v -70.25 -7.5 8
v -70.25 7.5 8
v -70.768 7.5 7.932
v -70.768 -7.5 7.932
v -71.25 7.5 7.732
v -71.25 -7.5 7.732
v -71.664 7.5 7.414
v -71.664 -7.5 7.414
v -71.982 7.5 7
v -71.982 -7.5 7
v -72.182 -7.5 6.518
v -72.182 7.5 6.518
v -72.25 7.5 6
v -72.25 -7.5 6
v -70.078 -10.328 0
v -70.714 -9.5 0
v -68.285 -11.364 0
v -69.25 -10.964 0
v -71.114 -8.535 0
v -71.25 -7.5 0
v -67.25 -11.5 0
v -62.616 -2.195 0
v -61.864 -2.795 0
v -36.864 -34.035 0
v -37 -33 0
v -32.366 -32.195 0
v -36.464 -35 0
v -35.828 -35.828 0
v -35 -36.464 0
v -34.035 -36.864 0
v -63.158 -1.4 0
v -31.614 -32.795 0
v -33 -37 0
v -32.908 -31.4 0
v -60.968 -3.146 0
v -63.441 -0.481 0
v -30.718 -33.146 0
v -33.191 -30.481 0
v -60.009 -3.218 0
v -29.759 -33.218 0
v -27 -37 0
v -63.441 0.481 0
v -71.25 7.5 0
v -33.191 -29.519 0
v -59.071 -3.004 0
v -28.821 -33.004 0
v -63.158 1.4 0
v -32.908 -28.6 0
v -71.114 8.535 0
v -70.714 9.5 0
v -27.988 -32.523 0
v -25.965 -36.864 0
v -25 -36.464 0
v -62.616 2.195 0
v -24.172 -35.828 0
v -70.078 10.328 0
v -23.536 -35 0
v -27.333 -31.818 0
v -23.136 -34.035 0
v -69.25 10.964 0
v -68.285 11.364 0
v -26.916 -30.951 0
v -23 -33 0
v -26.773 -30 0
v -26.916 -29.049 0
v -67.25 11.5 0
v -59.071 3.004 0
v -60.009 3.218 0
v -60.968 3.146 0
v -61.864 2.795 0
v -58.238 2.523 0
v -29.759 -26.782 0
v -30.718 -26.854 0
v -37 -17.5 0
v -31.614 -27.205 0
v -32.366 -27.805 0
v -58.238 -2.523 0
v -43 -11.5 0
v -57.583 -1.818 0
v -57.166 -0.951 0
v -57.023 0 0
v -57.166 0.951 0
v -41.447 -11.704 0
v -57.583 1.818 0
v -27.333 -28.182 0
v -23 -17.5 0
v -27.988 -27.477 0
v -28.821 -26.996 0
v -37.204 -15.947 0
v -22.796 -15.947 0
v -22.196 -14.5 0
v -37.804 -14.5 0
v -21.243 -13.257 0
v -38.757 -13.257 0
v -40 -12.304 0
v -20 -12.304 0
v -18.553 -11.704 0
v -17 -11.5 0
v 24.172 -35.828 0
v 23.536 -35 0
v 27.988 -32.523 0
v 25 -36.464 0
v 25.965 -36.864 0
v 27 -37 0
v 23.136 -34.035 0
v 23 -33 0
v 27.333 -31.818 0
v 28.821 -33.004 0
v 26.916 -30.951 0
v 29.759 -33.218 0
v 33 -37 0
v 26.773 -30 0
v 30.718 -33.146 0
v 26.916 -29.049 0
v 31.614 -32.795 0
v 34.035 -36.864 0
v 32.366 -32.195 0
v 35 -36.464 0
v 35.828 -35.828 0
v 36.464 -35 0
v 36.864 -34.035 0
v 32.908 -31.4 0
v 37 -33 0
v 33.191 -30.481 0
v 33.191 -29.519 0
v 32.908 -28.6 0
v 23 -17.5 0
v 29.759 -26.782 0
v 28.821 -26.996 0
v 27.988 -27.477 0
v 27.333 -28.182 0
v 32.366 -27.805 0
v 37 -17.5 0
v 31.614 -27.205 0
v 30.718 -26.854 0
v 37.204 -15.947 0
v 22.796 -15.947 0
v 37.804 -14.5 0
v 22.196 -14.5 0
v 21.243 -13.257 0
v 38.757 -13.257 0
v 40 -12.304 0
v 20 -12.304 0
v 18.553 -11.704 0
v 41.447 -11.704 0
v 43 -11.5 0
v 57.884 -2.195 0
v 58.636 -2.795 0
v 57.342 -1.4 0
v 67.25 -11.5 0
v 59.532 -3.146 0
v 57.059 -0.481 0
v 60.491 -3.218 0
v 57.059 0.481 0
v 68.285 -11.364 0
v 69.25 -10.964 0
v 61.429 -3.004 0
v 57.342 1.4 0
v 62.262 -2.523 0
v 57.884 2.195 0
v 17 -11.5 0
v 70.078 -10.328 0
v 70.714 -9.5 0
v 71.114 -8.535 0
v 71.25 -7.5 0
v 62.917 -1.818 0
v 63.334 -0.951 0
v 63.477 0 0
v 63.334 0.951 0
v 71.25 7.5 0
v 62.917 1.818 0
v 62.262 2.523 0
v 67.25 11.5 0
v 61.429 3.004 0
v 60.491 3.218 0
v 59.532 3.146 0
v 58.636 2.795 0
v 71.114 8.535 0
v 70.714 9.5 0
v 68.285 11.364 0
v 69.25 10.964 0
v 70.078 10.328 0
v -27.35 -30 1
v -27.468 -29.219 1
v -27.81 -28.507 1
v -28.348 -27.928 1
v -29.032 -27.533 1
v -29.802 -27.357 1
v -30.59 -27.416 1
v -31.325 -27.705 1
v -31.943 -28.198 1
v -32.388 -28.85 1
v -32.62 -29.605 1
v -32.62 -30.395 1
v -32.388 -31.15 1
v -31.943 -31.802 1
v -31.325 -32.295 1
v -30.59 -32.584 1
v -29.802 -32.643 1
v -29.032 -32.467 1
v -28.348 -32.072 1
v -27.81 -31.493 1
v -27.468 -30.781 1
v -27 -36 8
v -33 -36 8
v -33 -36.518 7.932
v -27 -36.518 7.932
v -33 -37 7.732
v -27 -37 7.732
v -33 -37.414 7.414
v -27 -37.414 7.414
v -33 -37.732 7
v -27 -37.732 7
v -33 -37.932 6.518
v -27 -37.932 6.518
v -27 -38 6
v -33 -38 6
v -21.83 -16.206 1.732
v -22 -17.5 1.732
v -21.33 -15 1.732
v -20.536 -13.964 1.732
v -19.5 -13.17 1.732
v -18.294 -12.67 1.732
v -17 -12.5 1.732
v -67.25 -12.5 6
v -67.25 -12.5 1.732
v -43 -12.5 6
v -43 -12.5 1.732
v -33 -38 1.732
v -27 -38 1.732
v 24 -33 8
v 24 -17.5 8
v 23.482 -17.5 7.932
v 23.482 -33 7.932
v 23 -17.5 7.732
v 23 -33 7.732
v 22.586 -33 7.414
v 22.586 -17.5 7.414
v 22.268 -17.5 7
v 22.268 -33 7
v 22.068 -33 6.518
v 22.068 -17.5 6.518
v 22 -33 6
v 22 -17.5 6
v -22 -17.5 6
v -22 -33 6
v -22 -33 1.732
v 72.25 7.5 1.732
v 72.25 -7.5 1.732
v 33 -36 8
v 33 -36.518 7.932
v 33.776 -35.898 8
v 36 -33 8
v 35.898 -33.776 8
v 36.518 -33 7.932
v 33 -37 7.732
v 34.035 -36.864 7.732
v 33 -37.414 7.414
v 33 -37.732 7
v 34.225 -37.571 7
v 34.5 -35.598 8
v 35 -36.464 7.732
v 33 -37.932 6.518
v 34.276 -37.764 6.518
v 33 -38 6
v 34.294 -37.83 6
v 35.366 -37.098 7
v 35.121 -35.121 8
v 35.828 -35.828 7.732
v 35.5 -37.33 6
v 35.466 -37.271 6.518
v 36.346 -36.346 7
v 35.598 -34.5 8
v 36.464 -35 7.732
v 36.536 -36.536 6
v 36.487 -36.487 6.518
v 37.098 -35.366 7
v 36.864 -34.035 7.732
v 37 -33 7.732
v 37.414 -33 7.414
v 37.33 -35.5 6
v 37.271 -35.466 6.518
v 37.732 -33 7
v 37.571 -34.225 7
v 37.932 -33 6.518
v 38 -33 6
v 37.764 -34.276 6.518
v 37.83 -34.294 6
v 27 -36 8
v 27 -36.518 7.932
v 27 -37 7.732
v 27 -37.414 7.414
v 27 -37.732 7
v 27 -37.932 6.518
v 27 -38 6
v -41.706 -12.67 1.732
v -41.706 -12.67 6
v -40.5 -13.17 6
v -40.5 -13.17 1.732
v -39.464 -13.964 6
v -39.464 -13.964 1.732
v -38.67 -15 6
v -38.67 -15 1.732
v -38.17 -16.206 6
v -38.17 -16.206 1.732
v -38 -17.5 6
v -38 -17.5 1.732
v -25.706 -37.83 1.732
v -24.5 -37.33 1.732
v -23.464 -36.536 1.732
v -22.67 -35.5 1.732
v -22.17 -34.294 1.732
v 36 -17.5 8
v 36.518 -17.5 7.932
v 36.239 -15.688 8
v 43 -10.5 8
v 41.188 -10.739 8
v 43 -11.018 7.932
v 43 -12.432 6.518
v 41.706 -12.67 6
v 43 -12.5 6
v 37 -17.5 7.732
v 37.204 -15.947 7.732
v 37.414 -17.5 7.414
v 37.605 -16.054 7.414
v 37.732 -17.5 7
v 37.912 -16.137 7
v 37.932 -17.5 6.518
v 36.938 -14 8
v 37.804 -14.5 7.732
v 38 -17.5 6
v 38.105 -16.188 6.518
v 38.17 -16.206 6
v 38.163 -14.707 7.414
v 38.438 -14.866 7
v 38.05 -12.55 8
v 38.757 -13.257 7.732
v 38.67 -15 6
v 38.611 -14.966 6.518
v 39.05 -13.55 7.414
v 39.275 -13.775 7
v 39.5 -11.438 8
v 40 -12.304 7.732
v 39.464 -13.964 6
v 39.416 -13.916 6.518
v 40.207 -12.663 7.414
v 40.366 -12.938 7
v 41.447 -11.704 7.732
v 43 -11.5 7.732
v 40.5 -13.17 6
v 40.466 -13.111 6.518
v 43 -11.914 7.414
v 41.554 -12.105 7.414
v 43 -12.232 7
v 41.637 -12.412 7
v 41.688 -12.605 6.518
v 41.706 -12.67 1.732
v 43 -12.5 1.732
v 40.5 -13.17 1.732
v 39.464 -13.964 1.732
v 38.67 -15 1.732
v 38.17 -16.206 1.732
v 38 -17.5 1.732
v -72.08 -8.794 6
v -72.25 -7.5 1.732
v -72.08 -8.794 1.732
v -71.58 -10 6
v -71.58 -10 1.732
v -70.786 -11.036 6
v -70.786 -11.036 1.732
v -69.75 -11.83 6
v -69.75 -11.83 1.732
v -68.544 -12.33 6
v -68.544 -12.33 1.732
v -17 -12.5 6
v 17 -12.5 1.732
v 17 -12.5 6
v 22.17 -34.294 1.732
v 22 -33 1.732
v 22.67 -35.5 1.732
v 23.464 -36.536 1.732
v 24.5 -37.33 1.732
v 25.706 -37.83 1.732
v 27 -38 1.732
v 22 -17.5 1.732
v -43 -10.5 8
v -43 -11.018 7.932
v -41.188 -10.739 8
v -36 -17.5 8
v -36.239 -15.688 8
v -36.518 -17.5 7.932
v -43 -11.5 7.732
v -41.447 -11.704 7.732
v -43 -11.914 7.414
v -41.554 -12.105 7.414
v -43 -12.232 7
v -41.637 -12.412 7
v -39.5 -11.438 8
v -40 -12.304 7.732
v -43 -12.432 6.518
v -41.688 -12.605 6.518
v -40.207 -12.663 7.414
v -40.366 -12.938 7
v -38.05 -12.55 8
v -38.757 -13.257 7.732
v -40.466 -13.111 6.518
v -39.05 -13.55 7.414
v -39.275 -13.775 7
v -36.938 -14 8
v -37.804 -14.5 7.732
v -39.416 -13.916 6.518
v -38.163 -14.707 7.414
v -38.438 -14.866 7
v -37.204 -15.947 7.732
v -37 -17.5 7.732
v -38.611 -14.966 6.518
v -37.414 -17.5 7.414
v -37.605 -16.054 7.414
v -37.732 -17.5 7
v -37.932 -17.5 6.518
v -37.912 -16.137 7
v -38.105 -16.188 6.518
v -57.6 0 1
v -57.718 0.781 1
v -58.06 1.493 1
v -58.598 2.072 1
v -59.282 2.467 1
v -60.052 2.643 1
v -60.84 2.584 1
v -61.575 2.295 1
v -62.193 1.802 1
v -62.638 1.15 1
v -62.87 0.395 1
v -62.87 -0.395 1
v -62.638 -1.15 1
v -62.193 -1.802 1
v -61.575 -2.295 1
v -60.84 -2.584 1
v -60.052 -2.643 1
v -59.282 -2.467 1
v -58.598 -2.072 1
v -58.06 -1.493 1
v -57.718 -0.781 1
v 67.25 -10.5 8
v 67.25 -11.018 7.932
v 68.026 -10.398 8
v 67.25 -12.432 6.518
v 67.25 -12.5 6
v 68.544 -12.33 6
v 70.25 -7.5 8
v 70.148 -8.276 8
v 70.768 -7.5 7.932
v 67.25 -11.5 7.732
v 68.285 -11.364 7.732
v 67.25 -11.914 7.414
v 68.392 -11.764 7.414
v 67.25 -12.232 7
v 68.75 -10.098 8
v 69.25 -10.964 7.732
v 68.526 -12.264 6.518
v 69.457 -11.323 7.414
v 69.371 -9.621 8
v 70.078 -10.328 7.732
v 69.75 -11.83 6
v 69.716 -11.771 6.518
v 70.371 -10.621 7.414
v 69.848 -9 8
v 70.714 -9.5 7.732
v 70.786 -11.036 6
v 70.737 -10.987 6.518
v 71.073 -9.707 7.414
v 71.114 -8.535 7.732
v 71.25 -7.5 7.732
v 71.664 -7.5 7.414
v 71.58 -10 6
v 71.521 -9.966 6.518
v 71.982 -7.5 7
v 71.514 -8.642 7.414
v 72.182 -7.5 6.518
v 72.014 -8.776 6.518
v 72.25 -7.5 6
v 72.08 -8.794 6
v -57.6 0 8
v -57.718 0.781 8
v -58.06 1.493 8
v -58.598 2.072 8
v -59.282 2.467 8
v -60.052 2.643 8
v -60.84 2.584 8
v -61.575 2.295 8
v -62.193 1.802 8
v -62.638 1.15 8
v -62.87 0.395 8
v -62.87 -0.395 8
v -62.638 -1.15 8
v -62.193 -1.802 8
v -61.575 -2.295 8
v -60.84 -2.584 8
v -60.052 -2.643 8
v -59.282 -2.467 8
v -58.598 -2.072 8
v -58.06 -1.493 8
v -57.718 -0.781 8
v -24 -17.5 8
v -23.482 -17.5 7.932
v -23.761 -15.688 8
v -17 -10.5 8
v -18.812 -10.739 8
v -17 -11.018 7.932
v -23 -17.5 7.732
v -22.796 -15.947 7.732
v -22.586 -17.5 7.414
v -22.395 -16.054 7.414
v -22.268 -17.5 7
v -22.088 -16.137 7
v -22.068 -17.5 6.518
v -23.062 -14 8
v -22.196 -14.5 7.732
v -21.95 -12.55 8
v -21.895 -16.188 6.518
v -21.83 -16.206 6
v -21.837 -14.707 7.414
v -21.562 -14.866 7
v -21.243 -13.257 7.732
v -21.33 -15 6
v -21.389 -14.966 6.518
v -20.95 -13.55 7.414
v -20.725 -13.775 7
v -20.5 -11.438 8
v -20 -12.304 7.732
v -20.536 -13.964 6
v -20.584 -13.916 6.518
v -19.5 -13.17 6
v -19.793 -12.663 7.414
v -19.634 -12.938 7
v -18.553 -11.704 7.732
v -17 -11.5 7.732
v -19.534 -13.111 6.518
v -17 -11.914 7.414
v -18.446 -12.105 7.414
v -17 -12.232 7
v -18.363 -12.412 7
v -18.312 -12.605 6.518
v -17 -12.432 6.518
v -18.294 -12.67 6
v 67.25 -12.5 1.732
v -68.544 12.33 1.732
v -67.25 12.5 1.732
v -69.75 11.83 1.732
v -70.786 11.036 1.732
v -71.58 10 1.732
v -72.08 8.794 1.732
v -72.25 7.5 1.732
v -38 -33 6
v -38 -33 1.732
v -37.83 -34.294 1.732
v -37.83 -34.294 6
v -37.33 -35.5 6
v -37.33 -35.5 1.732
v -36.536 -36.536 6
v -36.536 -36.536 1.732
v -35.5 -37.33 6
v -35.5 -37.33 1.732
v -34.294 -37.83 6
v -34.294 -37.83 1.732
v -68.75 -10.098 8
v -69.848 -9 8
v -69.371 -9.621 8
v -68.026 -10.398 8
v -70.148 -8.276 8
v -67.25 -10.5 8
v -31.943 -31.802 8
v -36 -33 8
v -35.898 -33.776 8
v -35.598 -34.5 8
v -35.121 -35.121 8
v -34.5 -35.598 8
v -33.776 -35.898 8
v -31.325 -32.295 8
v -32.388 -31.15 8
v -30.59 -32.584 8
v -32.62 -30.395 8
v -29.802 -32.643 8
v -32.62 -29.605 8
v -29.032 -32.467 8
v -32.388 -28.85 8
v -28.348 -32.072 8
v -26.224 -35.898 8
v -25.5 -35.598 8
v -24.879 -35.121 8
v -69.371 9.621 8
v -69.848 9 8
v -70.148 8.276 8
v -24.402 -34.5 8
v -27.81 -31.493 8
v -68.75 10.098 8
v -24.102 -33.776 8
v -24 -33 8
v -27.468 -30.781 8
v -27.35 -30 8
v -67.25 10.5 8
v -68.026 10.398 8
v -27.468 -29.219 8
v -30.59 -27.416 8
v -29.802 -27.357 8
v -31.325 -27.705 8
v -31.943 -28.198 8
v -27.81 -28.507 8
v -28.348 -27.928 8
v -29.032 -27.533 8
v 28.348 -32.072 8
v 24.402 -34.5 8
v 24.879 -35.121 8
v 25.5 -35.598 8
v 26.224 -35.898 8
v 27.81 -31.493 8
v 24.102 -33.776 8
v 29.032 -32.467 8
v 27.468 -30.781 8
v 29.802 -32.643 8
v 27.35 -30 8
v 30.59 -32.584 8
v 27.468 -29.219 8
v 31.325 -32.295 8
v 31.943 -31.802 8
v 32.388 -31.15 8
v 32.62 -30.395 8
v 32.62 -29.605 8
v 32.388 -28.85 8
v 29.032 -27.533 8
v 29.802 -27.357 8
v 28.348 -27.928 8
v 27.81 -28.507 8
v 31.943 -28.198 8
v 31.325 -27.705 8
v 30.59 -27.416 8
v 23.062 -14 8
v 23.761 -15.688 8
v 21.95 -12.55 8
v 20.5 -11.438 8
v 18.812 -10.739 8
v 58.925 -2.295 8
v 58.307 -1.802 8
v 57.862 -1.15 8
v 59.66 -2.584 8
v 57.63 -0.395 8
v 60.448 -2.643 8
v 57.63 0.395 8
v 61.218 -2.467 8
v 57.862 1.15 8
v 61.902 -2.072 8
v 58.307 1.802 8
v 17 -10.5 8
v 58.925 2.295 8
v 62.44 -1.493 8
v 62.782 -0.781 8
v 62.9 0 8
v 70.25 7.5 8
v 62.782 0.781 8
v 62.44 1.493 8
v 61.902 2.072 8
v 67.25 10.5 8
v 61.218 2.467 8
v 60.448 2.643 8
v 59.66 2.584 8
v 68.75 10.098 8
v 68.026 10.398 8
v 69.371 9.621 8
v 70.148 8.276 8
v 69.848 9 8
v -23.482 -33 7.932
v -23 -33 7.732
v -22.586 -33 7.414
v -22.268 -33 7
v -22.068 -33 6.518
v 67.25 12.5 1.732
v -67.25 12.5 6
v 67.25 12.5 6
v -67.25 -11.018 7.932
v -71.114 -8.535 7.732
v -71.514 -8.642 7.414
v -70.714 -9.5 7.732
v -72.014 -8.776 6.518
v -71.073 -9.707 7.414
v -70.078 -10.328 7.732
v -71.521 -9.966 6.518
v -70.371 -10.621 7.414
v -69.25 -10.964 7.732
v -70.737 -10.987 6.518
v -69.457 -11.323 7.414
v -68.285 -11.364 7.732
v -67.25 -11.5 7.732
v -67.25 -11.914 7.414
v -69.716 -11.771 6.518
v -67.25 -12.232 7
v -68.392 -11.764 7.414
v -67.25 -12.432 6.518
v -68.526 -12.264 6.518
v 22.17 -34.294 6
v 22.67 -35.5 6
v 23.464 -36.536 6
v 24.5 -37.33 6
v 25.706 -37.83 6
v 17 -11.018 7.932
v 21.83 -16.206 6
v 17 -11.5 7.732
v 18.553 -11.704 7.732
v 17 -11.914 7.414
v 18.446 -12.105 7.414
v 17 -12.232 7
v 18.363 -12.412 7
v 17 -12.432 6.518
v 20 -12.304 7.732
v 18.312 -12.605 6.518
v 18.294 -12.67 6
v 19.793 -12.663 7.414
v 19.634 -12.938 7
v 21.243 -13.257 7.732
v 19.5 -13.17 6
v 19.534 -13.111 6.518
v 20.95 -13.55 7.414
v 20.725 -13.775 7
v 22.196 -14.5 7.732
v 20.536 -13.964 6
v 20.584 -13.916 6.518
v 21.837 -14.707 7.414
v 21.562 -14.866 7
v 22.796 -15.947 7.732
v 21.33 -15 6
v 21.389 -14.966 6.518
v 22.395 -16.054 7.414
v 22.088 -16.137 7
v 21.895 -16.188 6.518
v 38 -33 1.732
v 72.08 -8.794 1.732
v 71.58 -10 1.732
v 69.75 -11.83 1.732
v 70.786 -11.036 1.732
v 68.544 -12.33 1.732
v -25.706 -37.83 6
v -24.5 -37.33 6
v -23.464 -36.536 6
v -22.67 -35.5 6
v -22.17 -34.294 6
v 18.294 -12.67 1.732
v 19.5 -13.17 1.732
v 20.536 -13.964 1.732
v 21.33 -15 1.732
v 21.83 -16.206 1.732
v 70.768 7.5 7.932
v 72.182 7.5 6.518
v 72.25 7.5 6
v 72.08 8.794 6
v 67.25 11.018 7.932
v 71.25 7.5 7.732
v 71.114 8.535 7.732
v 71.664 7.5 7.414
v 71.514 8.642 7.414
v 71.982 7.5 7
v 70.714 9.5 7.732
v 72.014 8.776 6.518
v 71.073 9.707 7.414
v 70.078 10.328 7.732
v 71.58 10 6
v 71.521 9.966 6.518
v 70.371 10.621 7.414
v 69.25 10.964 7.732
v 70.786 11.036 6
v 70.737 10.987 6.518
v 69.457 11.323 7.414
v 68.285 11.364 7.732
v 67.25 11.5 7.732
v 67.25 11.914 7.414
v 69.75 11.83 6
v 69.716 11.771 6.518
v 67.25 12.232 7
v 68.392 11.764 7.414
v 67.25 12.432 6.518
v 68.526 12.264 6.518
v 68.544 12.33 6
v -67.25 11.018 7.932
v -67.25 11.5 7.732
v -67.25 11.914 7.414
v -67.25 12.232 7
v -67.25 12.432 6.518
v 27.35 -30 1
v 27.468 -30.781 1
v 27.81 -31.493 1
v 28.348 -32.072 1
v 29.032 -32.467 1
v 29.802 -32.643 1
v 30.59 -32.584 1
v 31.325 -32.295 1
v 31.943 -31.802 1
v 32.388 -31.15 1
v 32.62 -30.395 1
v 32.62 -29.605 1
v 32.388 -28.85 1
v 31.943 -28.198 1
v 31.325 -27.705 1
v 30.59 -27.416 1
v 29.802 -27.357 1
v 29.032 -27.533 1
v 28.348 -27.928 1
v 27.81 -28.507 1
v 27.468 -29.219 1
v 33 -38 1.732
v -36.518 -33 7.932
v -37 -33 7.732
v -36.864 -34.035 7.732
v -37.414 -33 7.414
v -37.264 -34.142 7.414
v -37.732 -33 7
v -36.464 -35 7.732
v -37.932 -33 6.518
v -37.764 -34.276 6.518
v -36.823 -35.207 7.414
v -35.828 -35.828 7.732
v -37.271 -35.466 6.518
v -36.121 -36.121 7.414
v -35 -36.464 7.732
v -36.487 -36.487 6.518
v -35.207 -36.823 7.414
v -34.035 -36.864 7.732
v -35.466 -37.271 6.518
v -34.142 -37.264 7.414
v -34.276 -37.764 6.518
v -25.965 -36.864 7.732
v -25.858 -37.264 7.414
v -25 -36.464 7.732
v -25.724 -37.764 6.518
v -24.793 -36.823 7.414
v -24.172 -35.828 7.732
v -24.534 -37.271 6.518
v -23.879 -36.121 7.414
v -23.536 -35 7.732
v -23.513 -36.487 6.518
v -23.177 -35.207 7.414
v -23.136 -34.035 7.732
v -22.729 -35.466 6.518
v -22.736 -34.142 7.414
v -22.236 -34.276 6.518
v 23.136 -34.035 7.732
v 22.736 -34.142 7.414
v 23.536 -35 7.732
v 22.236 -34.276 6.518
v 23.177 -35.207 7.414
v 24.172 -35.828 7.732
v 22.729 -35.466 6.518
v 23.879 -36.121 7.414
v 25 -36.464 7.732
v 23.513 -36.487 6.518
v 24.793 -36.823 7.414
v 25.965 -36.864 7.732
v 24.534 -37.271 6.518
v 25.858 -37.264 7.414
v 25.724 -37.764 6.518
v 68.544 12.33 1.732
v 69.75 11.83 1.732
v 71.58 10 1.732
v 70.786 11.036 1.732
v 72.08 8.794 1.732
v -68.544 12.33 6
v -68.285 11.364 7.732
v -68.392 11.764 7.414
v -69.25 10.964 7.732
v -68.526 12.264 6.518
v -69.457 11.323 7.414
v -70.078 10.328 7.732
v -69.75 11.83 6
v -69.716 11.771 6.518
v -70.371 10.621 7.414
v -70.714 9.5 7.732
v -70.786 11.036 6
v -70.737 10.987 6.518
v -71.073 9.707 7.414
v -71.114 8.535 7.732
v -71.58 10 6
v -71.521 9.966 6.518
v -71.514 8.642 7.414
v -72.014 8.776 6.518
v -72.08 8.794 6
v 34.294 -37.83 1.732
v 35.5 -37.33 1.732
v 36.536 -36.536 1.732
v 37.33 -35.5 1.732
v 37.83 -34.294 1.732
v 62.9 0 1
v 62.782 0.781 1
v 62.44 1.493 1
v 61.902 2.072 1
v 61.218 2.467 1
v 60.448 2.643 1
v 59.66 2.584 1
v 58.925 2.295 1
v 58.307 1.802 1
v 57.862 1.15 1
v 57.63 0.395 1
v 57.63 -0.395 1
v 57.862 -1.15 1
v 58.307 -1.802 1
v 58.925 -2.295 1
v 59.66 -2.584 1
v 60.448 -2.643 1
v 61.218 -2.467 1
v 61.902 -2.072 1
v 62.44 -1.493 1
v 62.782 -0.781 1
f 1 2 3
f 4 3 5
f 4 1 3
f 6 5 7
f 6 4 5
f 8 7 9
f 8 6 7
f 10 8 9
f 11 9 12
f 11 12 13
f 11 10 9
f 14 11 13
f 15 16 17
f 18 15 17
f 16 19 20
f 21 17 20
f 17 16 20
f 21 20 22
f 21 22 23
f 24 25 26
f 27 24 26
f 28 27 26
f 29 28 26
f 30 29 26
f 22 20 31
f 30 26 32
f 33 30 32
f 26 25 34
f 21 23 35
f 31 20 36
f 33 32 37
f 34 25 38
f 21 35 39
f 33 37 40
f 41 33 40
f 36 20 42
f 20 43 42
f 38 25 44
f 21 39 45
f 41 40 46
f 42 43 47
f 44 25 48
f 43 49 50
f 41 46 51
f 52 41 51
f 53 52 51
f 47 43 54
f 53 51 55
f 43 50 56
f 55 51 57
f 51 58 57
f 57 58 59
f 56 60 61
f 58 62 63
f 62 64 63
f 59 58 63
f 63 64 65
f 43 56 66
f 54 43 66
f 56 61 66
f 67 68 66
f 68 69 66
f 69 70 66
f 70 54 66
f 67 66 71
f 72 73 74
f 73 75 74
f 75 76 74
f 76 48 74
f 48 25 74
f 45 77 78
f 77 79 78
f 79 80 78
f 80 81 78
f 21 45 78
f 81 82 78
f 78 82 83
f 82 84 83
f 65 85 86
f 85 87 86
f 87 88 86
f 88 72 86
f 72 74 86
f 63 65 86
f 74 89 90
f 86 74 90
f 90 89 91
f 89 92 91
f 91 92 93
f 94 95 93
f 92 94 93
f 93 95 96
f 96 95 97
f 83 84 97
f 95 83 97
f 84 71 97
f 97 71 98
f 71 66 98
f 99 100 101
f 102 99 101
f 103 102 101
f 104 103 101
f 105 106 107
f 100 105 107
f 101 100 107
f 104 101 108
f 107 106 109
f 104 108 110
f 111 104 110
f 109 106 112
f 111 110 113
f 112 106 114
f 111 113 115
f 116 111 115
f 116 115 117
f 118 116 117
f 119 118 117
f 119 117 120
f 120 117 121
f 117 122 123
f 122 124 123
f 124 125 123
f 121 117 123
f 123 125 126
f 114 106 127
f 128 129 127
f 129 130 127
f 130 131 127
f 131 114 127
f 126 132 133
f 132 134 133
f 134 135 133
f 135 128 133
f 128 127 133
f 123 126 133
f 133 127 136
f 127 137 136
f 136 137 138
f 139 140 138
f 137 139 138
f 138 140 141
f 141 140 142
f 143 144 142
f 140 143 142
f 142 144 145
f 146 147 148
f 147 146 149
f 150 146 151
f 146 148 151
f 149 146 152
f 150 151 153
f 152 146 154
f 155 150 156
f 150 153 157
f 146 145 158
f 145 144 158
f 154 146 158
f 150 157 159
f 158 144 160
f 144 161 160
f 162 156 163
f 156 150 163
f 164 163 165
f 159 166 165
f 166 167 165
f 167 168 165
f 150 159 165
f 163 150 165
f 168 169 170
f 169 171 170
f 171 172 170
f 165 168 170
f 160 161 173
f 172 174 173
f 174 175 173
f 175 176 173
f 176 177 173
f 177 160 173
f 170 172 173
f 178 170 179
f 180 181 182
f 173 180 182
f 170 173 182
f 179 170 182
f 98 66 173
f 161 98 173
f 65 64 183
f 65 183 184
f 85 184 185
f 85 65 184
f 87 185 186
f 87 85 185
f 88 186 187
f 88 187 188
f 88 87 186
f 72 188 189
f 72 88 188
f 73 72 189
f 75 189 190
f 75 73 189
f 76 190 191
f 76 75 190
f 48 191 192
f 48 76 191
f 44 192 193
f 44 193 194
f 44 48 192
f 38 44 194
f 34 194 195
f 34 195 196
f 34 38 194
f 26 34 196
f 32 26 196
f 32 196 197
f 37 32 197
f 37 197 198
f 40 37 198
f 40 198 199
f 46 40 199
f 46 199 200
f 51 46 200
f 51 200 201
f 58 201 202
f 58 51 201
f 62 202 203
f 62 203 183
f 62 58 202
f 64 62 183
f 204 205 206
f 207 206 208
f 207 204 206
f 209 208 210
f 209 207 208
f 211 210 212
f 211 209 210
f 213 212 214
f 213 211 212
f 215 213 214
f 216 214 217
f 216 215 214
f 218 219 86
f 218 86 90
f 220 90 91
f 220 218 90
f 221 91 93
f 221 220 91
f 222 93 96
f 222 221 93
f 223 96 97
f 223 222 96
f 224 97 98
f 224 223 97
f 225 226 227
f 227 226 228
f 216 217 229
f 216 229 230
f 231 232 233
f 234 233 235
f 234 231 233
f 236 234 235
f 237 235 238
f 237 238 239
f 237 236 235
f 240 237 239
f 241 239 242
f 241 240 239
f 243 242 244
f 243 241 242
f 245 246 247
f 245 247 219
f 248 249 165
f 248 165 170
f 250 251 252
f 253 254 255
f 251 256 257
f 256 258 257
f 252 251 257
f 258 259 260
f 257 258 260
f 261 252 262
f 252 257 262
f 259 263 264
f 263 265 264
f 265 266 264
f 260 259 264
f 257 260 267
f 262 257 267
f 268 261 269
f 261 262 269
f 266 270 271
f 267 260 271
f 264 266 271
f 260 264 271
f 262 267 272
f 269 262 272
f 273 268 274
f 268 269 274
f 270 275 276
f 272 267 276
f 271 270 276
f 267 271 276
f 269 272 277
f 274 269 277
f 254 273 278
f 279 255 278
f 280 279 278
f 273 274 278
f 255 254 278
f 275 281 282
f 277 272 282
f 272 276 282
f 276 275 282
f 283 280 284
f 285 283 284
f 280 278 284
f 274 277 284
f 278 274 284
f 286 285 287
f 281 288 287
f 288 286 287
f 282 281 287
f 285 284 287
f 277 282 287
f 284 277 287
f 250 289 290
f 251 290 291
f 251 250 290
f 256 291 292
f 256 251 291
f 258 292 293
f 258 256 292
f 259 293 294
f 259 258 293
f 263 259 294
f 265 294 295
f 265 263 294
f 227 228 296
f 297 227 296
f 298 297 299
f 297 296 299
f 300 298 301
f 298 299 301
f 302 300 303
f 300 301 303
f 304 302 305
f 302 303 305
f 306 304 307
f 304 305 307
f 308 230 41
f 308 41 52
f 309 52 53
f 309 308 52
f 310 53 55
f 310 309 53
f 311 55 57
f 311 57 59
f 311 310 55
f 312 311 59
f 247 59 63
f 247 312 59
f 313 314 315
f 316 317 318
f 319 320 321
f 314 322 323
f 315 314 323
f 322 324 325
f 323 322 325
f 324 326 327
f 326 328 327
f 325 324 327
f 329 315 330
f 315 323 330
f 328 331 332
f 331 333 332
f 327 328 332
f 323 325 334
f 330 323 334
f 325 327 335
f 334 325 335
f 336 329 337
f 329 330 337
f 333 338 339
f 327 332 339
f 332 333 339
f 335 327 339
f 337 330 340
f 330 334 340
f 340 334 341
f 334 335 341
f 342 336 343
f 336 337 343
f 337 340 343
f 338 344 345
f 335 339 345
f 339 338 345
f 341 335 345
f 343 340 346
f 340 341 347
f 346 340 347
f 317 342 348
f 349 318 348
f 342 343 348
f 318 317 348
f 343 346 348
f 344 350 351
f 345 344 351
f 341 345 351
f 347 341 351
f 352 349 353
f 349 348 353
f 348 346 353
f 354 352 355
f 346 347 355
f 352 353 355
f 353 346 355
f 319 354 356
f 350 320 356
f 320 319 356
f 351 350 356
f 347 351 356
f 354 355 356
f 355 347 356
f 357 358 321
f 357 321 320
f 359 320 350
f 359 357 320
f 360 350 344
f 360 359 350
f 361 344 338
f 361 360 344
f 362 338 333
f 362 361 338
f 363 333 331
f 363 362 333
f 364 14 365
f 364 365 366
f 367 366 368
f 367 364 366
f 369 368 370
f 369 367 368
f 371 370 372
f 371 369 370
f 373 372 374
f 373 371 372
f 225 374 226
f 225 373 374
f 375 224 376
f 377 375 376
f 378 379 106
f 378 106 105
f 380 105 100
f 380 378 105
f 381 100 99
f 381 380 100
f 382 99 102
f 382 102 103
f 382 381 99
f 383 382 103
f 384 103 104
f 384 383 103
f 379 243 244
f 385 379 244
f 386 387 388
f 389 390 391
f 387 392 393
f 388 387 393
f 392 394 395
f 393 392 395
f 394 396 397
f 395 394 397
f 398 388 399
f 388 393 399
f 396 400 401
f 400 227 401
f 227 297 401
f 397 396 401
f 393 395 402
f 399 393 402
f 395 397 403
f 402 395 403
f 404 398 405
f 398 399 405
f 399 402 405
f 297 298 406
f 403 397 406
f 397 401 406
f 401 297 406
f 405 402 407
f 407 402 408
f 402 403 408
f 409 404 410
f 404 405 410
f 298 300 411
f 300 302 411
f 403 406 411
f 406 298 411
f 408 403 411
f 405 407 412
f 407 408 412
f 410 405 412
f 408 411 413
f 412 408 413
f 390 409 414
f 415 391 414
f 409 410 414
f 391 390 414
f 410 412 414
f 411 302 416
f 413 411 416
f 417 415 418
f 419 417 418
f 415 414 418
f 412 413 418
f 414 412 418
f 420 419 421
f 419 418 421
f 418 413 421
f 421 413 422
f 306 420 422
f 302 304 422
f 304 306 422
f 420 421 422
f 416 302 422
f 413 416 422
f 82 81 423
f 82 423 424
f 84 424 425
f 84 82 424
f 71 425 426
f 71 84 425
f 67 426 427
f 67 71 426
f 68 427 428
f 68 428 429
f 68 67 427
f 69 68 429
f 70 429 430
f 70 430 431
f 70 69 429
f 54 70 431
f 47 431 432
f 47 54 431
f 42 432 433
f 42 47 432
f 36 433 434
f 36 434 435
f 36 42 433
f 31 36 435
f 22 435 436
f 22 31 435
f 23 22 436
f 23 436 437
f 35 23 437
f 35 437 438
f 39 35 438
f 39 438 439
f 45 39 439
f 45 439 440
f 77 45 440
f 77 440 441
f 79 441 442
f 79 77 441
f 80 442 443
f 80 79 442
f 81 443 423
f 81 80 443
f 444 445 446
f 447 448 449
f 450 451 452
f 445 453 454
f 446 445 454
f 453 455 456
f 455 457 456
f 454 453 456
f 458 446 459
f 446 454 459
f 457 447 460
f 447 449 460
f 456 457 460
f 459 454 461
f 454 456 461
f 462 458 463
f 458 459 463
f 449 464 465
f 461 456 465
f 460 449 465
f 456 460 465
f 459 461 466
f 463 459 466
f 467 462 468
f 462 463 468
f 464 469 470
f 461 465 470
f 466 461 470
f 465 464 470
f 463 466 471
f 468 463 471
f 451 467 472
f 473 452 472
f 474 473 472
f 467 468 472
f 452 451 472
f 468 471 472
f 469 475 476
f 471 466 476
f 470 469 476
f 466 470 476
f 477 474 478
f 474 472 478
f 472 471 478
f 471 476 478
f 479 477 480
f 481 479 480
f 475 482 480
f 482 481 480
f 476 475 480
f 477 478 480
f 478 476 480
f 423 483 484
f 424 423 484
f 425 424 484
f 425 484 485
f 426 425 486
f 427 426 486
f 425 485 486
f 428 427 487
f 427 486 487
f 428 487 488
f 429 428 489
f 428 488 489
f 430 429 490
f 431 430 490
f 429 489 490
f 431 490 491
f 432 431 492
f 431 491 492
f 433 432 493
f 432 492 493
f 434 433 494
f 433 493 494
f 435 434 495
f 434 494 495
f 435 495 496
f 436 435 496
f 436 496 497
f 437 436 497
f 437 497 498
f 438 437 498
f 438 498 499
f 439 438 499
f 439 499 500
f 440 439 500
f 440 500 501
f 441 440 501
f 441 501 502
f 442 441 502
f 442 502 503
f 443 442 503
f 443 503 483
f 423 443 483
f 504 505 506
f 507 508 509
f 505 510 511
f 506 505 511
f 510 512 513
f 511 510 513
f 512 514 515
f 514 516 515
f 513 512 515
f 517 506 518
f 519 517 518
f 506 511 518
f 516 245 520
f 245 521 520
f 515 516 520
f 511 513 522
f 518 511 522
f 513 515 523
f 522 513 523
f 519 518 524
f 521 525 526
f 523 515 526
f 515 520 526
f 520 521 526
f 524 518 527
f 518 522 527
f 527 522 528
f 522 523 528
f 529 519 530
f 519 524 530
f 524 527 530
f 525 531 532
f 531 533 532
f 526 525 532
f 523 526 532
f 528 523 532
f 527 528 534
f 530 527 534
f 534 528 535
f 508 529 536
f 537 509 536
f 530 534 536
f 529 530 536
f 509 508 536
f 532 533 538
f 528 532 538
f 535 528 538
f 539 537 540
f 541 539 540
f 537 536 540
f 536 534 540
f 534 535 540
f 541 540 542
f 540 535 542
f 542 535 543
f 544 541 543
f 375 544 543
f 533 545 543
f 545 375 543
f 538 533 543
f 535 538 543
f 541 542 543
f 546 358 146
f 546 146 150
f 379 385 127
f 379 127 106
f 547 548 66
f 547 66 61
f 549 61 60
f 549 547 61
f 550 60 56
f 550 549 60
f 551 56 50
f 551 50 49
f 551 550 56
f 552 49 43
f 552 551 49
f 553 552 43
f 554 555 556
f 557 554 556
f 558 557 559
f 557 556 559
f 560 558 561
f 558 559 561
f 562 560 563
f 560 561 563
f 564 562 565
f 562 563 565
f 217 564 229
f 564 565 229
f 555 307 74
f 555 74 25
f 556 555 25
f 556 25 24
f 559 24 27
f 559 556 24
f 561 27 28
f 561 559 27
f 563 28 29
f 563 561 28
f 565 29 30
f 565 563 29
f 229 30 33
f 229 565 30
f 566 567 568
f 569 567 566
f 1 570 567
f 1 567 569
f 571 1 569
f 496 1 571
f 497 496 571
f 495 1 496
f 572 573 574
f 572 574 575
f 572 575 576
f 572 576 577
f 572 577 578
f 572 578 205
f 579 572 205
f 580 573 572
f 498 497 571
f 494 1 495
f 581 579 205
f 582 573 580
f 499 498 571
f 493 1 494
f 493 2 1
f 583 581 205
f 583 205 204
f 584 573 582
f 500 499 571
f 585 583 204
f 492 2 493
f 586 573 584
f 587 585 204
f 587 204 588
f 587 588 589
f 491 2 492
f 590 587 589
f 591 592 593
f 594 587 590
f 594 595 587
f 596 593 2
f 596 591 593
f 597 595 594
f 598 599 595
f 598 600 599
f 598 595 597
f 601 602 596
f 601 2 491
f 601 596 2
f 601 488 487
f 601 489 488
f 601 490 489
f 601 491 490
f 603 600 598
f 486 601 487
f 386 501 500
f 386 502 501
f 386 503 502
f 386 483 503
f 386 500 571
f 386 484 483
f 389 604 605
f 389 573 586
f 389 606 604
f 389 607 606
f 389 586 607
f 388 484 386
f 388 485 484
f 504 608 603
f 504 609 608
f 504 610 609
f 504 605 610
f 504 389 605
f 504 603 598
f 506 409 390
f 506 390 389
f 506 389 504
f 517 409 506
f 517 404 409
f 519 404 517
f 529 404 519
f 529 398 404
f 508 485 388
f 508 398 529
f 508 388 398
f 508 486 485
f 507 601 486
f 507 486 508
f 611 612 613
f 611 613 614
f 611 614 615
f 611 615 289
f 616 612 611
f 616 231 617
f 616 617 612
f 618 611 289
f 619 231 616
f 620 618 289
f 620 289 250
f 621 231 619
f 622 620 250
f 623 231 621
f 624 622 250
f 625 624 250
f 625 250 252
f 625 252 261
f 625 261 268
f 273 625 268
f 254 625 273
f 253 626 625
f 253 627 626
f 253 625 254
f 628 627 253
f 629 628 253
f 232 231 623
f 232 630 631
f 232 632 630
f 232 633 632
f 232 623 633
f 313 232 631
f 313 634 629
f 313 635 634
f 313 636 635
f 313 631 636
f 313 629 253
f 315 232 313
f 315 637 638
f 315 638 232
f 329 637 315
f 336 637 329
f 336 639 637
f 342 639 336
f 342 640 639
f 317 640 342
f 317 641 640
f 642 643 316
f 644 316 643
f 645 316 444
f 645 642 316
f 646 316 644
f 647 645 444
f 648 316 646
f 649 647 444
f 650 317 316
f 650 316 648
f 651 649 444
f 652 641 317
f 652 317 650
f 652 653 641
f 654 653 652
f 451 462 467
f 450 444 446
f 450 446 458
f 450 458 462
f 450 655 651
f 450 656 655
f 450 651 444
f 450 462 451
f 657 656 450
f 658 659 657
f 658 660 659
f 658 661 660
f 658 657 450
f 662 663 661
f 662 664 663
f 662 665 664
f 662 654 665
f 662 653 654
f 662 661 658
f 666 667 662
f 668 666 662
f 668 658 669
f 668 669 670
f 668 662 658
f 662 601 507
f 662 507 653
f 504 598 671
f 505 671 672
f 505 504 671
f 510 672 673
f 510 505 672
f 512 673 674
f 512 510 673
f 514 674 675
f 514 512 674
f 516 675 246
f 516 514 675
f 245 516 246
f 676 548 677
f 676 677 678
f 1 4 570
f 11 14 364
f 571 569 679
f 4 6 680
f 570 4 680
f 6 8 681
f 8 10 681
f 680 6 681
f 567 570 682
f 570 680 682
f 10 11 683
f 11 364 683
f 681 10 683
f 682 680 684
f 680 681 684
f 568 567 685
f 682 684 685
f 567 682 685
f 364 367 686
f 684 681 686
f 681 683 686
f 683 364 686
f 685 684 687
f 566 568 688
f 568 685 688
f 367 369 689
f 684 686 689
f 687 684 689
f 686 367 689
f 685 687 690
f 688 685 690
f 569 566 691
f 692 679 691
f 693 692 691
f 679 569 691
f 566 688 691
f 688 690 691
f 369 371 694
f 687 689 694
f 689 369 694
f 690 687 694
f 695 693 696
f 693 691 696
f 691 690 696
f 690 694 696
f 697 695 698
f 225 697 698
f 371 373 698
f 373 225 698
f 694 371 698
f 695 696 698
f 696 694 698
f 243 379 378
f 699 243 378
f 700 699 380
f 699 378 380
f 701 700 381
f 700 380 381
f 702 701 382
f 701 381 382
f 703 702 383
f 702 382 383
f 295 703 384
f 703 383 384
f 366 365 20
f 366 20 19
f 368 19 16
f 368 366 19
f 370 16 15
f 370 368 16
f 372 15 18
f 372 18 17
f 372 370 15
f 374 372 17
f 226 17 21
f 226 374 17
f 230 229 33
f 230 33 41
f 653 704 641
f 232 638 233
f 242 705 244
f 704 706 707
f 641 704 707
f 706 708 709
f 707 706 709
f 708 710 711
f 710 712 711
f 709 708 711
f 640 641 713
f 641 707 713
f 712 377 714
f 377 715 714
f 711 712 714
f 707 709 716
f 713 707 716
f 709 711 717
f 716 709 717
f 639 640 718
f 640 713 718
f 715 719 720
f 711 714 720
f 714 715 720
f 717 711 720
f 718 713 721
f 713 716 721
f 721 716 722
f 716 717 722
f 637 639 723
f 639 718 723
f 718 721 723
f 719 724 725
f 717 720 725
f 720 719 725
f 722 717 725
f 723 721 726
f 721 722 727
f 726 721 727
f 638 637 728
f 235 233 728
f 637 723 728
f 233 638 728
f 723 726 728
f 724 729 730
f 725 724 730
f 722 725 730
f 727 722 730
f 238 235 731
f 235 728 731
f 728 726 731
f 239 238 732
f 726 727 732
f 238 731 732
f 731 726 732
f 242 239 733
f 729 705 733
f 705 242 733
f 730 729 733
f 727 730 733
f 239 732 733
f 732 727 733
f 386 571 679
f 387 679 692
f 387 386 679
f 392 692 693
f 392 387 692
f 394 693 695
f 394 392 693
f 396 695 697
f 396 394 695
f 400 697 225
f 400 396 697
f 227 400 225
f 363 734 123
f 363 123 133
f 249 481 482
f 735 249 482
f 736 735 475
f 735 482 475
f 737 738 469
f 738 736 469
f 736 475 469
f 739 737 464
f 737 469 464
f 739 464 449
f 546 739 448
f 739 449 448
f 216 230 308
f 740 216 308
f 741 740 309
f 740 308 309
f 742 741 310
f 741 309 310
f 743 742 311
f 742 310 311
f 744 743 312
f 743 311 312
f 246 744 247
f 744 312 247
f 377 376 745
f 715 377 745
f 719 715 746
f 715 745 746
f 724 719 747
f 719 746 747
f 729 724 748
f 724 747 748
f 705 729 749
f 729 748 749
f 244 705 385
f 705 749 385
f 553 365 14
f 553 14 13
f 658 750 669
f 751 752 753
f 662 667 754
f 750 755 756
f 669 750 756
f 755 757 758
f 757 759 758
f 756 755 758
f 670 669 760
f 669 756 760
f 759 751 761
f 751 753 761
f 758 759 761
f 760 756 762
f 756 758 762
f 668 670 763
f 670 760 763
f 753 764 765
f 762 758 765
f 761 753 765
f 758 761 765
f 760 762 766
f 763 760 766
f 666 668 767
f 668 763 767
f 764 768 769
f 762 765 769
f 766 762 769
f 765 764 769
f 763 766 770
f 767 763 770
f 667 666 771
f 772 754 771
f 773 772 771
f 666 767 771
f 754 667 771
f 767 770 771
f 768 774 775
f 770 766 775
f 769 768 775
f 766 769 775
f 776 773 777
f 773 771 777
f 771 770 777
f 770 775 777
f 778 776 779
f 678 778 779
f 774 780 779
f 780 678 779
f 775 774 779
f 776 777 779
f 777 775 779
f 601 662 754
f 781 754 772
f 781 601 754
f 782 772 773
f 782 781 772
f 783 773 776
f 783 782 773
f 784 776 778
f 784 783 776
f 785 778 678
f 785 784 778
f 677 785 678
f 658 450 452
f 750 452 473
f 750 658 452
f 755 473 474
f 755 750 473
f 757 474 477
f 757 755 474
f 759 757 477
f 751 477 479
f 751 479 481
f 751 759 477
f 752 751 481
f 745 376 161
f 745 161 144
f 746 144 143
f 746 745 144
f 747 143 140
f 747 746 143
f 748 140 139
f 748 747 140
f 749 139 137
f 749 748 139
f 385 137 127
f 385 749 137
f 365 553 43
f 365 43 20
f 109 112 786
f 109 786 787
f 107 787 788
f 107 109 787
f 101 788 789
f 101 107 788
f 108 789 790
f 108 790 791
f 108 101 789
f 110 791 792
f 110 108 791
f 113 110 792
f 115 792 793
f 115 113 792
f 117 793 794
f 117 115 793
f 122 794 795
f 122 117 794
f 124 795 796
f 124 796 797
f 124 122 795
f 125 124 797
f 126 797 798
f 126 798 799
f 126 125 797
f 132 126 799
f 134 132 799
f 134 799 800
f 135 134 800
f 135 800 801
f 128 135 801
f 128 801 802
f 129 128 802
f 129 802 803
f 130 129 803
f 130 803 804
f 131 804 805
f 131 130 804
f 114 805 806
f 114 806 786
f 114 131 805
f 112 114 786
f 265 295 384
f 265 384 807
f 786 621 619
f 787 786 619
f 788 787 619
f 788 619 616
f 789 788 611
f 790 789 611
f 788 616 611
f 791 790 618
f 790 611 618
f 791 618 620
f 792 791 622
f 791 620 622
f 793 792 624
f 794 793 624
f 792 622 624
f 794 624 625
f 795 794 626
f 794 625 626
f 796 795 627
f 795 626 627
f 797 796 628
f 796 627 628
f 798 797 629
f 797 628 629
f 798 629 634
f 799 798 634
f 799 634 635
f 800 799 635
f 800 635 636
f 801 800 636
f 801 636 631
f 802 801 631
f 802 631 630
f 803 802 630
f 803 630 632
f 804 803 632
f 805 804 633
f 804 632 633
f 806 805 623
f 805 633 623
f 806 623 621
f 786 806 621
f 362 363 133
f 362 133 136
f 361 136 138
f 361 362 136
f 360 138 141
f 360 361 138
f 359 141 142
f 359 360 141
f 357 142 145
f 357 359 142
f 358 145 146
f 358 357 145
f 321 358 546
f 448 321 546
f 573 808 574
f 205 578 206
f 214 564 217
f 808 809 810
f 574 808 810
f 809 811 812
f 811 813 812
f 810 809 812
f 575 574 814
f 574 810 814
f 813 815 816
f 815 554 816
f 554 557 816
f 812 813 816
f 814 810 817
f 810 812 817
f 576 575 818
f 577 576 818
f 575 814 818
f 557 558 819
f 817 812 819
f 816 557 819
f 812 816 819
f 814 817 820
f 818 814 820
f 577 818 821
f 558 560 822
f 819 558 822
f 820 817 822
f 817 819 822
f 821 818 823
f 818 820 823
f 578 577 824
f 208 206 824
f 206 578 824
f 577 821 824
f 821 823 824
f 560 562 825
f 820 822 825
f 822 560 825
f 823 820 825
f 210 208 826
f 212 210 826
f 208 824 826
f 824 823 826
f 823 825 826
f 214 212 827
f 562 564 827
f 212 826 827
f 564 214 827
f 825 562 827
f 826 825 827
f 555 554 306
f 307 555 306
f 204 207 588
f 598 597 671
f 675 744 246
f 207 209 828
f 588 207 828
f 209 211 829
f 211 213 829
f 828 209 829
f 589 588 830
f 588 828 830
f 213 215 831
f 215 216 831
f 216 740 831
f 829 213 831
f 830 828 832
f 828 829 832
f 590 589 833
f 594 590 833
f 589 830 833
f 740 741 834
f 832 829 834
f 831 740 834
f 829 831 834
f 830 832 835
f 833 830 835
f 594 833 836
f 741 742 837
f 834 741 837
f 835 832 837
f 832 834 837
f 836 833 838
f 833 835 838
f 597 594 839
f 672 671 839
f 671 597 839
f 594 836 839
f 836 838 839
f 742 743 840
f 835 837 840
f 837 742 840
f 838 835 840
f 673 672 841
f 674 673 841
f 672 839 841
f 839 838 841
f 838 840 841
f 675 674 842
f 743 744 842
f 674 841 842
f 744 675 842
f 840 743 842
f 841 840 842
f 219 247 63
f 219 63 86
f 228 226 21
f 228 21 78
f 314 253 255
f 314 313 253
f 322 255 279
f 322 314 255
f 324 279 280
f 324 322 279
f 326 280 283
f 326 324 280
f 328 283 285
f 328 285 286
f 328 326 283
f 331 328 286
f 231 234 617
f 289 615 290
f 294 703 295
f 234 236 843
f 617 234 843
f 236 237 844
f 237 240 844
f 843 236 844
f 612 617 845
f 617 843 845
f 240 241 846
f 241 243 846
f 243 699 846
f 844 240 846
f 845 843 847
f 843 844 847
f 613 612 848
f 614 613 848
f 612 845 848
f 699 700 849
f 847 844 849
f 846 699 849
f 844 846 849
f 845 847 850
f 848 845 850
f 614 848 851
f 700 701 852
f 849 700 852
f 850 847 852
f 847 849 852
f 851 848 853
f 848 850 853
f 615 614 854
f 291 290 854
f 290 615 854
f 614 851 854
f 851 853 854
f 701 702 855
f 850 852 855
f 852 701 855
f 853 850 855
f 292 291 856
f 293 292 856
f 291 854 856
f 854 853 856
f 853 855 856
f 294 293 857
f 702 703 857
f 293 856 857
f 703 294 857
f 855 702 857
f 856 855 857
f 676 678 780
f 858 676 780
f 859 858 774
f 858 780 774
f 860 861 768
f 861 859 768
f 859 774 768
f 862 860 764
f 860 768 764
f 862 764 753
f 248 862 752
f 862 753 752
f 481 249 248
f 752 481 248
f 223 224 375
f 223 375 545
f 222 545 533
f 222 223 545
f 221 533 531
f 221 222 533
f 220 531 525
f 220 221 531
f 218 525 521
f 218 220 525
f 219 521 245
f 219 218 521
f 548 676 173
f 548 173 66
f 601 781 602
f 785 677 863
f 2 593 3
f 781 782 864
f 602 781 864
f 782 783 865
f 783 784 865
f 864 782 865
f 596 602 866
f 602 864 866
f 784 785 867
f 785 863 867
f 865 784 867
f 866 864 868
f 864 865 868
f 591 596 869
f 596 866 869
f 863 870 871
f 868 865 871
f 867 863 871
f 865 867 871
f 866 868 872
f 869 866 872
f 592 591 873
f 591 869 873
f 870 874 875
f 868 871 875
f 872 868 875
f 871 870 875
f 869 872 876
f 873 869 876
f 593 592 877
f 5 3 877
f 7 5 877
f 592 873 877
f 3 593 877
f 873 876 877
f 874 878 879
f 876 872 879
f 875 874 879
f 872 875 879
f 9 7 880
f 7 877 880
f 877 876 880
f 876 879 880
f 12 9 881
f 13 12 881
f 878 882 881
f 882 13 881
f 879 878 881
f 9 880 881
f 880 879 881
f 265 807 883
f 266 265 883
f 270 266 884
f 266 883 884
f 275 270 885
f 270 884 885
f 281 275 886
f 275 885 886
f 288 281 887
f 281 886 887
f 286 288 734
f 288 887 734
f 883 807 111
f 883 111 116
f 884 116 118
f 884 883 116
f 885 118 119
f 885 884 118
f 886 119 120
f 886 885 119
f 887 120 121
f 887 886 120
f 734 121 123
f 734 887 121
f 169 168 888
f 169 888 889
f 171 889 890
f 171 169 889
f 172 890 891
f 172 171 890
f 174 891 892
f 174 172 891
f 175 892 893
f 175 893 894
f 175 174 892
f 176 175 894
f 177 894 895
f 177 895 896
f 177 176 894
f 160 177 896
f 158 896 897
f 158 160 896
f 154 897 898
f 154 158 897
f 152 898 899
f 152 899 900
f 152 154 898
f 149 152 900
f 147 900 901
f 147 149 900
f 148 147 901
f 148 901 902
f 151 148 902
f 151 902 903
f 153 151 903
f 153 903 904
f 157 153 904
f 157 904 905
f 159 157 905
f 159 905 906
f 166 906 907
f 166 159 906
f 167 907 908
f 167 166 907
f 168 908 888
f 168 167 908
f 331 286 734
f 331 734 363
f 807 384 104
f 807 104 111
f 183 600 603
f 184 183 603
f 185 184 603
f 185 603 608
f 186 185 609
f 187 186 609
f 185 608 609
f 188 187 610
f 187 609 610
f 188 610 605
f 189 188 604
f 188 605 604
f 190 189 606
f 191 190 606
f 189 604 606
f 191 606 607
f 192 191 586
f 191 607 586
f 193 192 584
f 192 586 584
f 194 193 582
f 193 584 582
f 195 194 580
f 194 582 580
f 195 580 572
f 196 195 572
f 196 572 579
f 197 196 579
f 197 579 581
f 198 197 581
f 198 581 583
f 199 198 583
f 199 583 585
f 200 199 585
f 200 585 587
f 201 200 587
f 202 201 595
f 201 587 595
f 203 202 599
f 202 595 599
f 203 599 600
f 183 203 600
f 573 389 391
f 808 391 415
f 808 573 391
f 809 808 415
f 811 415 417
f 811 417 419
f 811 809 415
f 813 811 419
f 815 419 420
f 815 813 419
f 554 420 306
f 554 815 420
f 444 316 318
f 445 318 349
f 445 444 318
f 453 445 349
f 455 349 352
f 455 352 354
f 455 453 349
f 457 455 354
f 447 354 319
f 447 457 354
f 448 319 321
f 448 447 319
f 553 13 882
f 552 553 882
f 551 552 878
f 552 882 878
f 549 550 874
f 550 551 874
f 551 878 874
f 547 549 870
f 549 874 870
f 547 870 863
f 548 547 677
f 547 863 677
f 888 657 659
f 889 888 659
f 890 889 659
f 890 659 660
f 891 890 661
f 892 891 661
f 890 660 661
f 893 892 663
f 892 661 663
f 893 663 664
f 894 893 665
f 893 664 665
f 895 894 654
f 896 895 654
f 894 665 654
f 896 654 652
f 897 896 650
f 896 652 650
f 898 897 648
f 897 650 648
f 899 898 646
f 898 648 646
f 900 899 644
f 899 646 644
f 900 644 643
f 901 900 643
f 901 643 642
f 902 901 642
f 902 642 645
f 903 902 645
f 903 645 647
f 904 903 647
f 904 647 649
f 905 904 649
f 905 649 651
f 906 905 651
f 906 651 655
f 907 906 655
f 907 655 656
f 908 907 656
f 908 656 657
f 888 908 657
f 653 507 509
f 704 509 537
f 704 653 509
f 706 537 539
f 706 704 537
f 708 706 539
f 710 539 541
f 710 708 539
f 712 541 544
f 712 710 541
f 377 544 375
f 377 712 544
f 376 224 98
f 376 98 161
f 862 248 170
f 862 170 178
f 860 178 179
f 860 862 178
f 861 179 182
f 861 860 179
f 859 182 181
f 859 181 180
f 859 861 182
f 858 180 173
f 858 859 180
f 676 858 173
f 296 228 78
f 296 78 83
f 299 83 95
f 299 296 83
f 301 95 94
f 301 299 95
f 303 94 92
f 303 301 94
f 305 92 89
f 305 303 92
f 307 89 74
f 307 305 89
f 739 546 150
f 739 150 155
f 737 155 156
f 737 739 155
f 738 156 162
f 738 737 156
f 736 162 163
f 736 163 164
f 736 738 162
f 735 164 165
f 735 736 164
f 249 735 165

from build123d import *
from OCP.BRepFilletAPI import BRepFilletAPI_MakeChamfer

# Parameters (mm, degrees)
SKETCH2_W           = 144.5
SKETCH2_H           = 25
BOSS_EXTRUDE1_DEPTH = 8
SKETCH3_R           = 2.65
CUT_EXTRUDE1_DEPTH  = 74.758474089
SKETCH5_W           = 16
SKETCH5_H           = 25.5
SKETCH5_R           = 2.65
BOSS_EXTRUDE2_DEPTH = 8
FILLET1_R           = 5
FILLET2_R           = 2
CHAMFER1_SIZE       = 1
CHAMFER1_SIZE2      = 1.732050808
CHAMFER2_SIZE       = 1
CHAMFER2_SIZE2      = 0.577350269


with BuildPart() as part:
    # Sketch2 → Boss-Extrude1 (new body)
    with BuildSketch(Plane.XY):
        Rectangle(SKETCH2_W, SKETCH2_H)
    extrude(amount=BOSS_EXTRUDE1_DEPTH)

    # Sketch3 → Cut-Extrude1 (cut, through all)
    with BuildSketch(Plane.XY.offset(8)):
        with Locations((-60.25, 0)):
            Circle(SKETCH3_R)
        with Locations((60.25, 0)):
            Circle(SKETCH3_R)
    extrude(amount=-CUT_EXTRUDE1_DEPTH, mode=Mode.SUBTRACT)

    # Sketch5 → Boss-Extrude2 (add)
    # profile 1 of 2: a face of its own
    with BuildSketch(Plane.XY.offset(8)):
        with Locations((-30, -25.25)):
            Rectangle(SKETCH5_W, SKETCH5_H)
        with Locations((-30, -30)):
            Circle(SKETCH5_R, mode=Mode.SUBTRACT)
    # profile 2 of 2: a face of its own
    with BuildSketch(Plane.XY.offset(8)):
        with Locations((30, -25.25)):
            Rectangle(SKETCH5_W, SKETCH5_H)
        with Locations(Location((30, -30, 0), (0, 0, 180))):
            Circle(SKETCH5_R, mode=Mode.SUBTRACT)
    extrude(amount=-BOSS_EXTRUDE2_DEPTH)

    # Fillet1
    fillet1_edges = [part.edges().sort_by_distance(p)[0] for p in [
        (-38, -38, 4),
        (-38, -12.5, 4),
        (-22, -12.5, 4),
        (-22, -38, 4),
        (38, -12.5, 4),
        (38, -38, 4),
        (22, -38, 4),
        (22, -12.5, 4),
        (72.25, -12.5, 4),
        (-72.25, -12.5, 4),
        (-72.25, 12.5, 4),
        (72.25, 12.5, 4),
    ]]
    fillet(fillet1_edges, radius=FILLET1_R)

    # Fillet2
    fillet2_edges = [part.edges().sort_by_distance(p)[0] for p in [
        (38, -25.25, 8),
        (55.125, -12.5, 8),
        (30, -38, 8),
        (72.25, 0, 8),
        (0, 12.5, 8),
        (-72.25, 0, 8),
        (-55.125, -12.5, 8),
        (-38, -25.25, 8),
        (-30, -38, 8),
        (-22, -25.25, 8),
        (0, -12.5, 8),
        (22, -25.25, 8),
        (70.785533906, 11.035533906, 8),
        (70.785533906, -11.035533906, 8),
        (-70.785533906, 11.035533906, 8),
        (-70.785533906, -11.035533906, 8),
        (-23.464466094, -36.535533906, 8),
        (-36.535533906, -36.535533906, 8),
        (23.464466094, -36.535533906, 8),
        (36.535533906, -36.535533906, 8),
        (39.464466094, -13.964466094, 8),
        (20.535533906, -13.964466094, 8),
        (-39.464466094, -13.964466094, 8),
        (-20.535533906, -13.964466094, 8),
    ]]
    fillet(fillet2_edges, radius=FILLET2_R)

    # Chamfer1
    chamfer1_edges = [part.edges().sort_by_distance(p)[0] for p in [
        (38, -25.25, 0),
        (55.125, -12.5, 0),
        (30, -38, 0),
        (72.25, 0, 0),
        (22, -25.25, 0),
        (0, -12.5, 0),
        (-22, -25.25, 0),
        (-30, -38, 0),
        (-38, -25.25, 0),
        (-55.125, -12.5, 0),
        (-72.25, 0, 0),
        (0, 12.5, 0),
        (70.785533906, 11.035533906, 0),
        (70.785533906, -11.035533906, 0),
        (-70.785533906, 11.035533906, 0),
        (-70.785533906, -11.035533906, 0),
        (-23.464466094, -36.535533906, 0),
        (-36.535533906, -36.535533906, 0),
        (23.464466094, -36.535533906, 0),
        (36.535533906, -36.535533906, 0),
        (39.464466094, -13.964466094, 0),
        (20.535533906, -13.964466094, 0),
        (-39.464466094, -13.964466094, 0),
        (-20.535533906, -13.964466094, 0),
    ]]
    chamfer1_side = [part.faces().sort_by_distance(p)[0] for p in [
        (0, -4.348667021, 0),
    ]]
    chamfer(chamfer1_edges, length=CHAMFER1_SIZE, length2=CHAMFER1_SIZE2, reference=chamfer1_side[0])

    # Chamfer2: one chamfer whose edges measure the first distance from different faces: ONE call of the kernel's chamfer builder (chamfer() names one face for all edges)
    chamfer2_edges_1 = [part.edges().sort_by_distance(p)[0] for p in [
        (-62.9, 0, 0),
    ]]
    chamfer2_side_1 = [part.faces().sort_by_distance(p)[0] for p in [
        (-62.9, 0, 4),
    ]]
    chamfer2_edges_2 = [part.edges().sort_by_distance(p)[0] for p in [
        (57.6, 0, 0),
    ]]
    chamfer2_side_2 = [part.faces().sort_by_distance(p)[0] for p in [
        (57.6, 0, 4),
    ]]
    chamfer2_edges_3 = [part.edges().sort_by_distance(p)[0] for p in [
        (-32.65, -30, 0),
    ]]
    chamfer2_side_3 = [part.faces().sort_by_distance(p)[0] for p in [
        (-32.65, -30, 4),
    ]]
    chamfer2_edges_4 = [part.edges().sort_by_distance(p)[0] for p in [
        (32.65, -30, 0),
    ]]
    chamfer2_side_4 = [part.faces().sort_by_distance(p)[0] for p in [
        (32.65, -30, 4),
    ]]
    chamfer2 = BRepFilletAPI_MakeChamfer(part.part.solid().wrapped)
    for e in chamfer2_edges_1:
        chamfer2.Add(CHAMFER2_SIZE, CHAMFER2_SIZE2, e.wrapped, chamfer2_side_1[0].wrapped)  # the first distance lies on this face
    for e in chamfer2_edges_2:
        chamfer2.Add(CHAMFER2_SIZE, CHAMFER2_SIZE2, e.wrapped, chamfer2_side_2[0].wrapped)  # the first distance lies on this face
    for e in chamfer2_edges_3:
        chamfer2.Add(CHAMFER2_SIZE, CHAMFER2_SIZE2, e.wrapped, chamfer2_side_3[0].wrapped)  # the first distance lies on this face
    for e in chamfer2_edges_4:
        chamfer2.Add(CHAMFER2_SIZE, CHAMFER2_SIZE2, e.wrapped, chamfer2_side_4[0].wrapped)  # the first distance lies on this face
    add(Compound.cast(chamfer2.Shape()), mode=Mode.REPLACE)


solid = part.part
